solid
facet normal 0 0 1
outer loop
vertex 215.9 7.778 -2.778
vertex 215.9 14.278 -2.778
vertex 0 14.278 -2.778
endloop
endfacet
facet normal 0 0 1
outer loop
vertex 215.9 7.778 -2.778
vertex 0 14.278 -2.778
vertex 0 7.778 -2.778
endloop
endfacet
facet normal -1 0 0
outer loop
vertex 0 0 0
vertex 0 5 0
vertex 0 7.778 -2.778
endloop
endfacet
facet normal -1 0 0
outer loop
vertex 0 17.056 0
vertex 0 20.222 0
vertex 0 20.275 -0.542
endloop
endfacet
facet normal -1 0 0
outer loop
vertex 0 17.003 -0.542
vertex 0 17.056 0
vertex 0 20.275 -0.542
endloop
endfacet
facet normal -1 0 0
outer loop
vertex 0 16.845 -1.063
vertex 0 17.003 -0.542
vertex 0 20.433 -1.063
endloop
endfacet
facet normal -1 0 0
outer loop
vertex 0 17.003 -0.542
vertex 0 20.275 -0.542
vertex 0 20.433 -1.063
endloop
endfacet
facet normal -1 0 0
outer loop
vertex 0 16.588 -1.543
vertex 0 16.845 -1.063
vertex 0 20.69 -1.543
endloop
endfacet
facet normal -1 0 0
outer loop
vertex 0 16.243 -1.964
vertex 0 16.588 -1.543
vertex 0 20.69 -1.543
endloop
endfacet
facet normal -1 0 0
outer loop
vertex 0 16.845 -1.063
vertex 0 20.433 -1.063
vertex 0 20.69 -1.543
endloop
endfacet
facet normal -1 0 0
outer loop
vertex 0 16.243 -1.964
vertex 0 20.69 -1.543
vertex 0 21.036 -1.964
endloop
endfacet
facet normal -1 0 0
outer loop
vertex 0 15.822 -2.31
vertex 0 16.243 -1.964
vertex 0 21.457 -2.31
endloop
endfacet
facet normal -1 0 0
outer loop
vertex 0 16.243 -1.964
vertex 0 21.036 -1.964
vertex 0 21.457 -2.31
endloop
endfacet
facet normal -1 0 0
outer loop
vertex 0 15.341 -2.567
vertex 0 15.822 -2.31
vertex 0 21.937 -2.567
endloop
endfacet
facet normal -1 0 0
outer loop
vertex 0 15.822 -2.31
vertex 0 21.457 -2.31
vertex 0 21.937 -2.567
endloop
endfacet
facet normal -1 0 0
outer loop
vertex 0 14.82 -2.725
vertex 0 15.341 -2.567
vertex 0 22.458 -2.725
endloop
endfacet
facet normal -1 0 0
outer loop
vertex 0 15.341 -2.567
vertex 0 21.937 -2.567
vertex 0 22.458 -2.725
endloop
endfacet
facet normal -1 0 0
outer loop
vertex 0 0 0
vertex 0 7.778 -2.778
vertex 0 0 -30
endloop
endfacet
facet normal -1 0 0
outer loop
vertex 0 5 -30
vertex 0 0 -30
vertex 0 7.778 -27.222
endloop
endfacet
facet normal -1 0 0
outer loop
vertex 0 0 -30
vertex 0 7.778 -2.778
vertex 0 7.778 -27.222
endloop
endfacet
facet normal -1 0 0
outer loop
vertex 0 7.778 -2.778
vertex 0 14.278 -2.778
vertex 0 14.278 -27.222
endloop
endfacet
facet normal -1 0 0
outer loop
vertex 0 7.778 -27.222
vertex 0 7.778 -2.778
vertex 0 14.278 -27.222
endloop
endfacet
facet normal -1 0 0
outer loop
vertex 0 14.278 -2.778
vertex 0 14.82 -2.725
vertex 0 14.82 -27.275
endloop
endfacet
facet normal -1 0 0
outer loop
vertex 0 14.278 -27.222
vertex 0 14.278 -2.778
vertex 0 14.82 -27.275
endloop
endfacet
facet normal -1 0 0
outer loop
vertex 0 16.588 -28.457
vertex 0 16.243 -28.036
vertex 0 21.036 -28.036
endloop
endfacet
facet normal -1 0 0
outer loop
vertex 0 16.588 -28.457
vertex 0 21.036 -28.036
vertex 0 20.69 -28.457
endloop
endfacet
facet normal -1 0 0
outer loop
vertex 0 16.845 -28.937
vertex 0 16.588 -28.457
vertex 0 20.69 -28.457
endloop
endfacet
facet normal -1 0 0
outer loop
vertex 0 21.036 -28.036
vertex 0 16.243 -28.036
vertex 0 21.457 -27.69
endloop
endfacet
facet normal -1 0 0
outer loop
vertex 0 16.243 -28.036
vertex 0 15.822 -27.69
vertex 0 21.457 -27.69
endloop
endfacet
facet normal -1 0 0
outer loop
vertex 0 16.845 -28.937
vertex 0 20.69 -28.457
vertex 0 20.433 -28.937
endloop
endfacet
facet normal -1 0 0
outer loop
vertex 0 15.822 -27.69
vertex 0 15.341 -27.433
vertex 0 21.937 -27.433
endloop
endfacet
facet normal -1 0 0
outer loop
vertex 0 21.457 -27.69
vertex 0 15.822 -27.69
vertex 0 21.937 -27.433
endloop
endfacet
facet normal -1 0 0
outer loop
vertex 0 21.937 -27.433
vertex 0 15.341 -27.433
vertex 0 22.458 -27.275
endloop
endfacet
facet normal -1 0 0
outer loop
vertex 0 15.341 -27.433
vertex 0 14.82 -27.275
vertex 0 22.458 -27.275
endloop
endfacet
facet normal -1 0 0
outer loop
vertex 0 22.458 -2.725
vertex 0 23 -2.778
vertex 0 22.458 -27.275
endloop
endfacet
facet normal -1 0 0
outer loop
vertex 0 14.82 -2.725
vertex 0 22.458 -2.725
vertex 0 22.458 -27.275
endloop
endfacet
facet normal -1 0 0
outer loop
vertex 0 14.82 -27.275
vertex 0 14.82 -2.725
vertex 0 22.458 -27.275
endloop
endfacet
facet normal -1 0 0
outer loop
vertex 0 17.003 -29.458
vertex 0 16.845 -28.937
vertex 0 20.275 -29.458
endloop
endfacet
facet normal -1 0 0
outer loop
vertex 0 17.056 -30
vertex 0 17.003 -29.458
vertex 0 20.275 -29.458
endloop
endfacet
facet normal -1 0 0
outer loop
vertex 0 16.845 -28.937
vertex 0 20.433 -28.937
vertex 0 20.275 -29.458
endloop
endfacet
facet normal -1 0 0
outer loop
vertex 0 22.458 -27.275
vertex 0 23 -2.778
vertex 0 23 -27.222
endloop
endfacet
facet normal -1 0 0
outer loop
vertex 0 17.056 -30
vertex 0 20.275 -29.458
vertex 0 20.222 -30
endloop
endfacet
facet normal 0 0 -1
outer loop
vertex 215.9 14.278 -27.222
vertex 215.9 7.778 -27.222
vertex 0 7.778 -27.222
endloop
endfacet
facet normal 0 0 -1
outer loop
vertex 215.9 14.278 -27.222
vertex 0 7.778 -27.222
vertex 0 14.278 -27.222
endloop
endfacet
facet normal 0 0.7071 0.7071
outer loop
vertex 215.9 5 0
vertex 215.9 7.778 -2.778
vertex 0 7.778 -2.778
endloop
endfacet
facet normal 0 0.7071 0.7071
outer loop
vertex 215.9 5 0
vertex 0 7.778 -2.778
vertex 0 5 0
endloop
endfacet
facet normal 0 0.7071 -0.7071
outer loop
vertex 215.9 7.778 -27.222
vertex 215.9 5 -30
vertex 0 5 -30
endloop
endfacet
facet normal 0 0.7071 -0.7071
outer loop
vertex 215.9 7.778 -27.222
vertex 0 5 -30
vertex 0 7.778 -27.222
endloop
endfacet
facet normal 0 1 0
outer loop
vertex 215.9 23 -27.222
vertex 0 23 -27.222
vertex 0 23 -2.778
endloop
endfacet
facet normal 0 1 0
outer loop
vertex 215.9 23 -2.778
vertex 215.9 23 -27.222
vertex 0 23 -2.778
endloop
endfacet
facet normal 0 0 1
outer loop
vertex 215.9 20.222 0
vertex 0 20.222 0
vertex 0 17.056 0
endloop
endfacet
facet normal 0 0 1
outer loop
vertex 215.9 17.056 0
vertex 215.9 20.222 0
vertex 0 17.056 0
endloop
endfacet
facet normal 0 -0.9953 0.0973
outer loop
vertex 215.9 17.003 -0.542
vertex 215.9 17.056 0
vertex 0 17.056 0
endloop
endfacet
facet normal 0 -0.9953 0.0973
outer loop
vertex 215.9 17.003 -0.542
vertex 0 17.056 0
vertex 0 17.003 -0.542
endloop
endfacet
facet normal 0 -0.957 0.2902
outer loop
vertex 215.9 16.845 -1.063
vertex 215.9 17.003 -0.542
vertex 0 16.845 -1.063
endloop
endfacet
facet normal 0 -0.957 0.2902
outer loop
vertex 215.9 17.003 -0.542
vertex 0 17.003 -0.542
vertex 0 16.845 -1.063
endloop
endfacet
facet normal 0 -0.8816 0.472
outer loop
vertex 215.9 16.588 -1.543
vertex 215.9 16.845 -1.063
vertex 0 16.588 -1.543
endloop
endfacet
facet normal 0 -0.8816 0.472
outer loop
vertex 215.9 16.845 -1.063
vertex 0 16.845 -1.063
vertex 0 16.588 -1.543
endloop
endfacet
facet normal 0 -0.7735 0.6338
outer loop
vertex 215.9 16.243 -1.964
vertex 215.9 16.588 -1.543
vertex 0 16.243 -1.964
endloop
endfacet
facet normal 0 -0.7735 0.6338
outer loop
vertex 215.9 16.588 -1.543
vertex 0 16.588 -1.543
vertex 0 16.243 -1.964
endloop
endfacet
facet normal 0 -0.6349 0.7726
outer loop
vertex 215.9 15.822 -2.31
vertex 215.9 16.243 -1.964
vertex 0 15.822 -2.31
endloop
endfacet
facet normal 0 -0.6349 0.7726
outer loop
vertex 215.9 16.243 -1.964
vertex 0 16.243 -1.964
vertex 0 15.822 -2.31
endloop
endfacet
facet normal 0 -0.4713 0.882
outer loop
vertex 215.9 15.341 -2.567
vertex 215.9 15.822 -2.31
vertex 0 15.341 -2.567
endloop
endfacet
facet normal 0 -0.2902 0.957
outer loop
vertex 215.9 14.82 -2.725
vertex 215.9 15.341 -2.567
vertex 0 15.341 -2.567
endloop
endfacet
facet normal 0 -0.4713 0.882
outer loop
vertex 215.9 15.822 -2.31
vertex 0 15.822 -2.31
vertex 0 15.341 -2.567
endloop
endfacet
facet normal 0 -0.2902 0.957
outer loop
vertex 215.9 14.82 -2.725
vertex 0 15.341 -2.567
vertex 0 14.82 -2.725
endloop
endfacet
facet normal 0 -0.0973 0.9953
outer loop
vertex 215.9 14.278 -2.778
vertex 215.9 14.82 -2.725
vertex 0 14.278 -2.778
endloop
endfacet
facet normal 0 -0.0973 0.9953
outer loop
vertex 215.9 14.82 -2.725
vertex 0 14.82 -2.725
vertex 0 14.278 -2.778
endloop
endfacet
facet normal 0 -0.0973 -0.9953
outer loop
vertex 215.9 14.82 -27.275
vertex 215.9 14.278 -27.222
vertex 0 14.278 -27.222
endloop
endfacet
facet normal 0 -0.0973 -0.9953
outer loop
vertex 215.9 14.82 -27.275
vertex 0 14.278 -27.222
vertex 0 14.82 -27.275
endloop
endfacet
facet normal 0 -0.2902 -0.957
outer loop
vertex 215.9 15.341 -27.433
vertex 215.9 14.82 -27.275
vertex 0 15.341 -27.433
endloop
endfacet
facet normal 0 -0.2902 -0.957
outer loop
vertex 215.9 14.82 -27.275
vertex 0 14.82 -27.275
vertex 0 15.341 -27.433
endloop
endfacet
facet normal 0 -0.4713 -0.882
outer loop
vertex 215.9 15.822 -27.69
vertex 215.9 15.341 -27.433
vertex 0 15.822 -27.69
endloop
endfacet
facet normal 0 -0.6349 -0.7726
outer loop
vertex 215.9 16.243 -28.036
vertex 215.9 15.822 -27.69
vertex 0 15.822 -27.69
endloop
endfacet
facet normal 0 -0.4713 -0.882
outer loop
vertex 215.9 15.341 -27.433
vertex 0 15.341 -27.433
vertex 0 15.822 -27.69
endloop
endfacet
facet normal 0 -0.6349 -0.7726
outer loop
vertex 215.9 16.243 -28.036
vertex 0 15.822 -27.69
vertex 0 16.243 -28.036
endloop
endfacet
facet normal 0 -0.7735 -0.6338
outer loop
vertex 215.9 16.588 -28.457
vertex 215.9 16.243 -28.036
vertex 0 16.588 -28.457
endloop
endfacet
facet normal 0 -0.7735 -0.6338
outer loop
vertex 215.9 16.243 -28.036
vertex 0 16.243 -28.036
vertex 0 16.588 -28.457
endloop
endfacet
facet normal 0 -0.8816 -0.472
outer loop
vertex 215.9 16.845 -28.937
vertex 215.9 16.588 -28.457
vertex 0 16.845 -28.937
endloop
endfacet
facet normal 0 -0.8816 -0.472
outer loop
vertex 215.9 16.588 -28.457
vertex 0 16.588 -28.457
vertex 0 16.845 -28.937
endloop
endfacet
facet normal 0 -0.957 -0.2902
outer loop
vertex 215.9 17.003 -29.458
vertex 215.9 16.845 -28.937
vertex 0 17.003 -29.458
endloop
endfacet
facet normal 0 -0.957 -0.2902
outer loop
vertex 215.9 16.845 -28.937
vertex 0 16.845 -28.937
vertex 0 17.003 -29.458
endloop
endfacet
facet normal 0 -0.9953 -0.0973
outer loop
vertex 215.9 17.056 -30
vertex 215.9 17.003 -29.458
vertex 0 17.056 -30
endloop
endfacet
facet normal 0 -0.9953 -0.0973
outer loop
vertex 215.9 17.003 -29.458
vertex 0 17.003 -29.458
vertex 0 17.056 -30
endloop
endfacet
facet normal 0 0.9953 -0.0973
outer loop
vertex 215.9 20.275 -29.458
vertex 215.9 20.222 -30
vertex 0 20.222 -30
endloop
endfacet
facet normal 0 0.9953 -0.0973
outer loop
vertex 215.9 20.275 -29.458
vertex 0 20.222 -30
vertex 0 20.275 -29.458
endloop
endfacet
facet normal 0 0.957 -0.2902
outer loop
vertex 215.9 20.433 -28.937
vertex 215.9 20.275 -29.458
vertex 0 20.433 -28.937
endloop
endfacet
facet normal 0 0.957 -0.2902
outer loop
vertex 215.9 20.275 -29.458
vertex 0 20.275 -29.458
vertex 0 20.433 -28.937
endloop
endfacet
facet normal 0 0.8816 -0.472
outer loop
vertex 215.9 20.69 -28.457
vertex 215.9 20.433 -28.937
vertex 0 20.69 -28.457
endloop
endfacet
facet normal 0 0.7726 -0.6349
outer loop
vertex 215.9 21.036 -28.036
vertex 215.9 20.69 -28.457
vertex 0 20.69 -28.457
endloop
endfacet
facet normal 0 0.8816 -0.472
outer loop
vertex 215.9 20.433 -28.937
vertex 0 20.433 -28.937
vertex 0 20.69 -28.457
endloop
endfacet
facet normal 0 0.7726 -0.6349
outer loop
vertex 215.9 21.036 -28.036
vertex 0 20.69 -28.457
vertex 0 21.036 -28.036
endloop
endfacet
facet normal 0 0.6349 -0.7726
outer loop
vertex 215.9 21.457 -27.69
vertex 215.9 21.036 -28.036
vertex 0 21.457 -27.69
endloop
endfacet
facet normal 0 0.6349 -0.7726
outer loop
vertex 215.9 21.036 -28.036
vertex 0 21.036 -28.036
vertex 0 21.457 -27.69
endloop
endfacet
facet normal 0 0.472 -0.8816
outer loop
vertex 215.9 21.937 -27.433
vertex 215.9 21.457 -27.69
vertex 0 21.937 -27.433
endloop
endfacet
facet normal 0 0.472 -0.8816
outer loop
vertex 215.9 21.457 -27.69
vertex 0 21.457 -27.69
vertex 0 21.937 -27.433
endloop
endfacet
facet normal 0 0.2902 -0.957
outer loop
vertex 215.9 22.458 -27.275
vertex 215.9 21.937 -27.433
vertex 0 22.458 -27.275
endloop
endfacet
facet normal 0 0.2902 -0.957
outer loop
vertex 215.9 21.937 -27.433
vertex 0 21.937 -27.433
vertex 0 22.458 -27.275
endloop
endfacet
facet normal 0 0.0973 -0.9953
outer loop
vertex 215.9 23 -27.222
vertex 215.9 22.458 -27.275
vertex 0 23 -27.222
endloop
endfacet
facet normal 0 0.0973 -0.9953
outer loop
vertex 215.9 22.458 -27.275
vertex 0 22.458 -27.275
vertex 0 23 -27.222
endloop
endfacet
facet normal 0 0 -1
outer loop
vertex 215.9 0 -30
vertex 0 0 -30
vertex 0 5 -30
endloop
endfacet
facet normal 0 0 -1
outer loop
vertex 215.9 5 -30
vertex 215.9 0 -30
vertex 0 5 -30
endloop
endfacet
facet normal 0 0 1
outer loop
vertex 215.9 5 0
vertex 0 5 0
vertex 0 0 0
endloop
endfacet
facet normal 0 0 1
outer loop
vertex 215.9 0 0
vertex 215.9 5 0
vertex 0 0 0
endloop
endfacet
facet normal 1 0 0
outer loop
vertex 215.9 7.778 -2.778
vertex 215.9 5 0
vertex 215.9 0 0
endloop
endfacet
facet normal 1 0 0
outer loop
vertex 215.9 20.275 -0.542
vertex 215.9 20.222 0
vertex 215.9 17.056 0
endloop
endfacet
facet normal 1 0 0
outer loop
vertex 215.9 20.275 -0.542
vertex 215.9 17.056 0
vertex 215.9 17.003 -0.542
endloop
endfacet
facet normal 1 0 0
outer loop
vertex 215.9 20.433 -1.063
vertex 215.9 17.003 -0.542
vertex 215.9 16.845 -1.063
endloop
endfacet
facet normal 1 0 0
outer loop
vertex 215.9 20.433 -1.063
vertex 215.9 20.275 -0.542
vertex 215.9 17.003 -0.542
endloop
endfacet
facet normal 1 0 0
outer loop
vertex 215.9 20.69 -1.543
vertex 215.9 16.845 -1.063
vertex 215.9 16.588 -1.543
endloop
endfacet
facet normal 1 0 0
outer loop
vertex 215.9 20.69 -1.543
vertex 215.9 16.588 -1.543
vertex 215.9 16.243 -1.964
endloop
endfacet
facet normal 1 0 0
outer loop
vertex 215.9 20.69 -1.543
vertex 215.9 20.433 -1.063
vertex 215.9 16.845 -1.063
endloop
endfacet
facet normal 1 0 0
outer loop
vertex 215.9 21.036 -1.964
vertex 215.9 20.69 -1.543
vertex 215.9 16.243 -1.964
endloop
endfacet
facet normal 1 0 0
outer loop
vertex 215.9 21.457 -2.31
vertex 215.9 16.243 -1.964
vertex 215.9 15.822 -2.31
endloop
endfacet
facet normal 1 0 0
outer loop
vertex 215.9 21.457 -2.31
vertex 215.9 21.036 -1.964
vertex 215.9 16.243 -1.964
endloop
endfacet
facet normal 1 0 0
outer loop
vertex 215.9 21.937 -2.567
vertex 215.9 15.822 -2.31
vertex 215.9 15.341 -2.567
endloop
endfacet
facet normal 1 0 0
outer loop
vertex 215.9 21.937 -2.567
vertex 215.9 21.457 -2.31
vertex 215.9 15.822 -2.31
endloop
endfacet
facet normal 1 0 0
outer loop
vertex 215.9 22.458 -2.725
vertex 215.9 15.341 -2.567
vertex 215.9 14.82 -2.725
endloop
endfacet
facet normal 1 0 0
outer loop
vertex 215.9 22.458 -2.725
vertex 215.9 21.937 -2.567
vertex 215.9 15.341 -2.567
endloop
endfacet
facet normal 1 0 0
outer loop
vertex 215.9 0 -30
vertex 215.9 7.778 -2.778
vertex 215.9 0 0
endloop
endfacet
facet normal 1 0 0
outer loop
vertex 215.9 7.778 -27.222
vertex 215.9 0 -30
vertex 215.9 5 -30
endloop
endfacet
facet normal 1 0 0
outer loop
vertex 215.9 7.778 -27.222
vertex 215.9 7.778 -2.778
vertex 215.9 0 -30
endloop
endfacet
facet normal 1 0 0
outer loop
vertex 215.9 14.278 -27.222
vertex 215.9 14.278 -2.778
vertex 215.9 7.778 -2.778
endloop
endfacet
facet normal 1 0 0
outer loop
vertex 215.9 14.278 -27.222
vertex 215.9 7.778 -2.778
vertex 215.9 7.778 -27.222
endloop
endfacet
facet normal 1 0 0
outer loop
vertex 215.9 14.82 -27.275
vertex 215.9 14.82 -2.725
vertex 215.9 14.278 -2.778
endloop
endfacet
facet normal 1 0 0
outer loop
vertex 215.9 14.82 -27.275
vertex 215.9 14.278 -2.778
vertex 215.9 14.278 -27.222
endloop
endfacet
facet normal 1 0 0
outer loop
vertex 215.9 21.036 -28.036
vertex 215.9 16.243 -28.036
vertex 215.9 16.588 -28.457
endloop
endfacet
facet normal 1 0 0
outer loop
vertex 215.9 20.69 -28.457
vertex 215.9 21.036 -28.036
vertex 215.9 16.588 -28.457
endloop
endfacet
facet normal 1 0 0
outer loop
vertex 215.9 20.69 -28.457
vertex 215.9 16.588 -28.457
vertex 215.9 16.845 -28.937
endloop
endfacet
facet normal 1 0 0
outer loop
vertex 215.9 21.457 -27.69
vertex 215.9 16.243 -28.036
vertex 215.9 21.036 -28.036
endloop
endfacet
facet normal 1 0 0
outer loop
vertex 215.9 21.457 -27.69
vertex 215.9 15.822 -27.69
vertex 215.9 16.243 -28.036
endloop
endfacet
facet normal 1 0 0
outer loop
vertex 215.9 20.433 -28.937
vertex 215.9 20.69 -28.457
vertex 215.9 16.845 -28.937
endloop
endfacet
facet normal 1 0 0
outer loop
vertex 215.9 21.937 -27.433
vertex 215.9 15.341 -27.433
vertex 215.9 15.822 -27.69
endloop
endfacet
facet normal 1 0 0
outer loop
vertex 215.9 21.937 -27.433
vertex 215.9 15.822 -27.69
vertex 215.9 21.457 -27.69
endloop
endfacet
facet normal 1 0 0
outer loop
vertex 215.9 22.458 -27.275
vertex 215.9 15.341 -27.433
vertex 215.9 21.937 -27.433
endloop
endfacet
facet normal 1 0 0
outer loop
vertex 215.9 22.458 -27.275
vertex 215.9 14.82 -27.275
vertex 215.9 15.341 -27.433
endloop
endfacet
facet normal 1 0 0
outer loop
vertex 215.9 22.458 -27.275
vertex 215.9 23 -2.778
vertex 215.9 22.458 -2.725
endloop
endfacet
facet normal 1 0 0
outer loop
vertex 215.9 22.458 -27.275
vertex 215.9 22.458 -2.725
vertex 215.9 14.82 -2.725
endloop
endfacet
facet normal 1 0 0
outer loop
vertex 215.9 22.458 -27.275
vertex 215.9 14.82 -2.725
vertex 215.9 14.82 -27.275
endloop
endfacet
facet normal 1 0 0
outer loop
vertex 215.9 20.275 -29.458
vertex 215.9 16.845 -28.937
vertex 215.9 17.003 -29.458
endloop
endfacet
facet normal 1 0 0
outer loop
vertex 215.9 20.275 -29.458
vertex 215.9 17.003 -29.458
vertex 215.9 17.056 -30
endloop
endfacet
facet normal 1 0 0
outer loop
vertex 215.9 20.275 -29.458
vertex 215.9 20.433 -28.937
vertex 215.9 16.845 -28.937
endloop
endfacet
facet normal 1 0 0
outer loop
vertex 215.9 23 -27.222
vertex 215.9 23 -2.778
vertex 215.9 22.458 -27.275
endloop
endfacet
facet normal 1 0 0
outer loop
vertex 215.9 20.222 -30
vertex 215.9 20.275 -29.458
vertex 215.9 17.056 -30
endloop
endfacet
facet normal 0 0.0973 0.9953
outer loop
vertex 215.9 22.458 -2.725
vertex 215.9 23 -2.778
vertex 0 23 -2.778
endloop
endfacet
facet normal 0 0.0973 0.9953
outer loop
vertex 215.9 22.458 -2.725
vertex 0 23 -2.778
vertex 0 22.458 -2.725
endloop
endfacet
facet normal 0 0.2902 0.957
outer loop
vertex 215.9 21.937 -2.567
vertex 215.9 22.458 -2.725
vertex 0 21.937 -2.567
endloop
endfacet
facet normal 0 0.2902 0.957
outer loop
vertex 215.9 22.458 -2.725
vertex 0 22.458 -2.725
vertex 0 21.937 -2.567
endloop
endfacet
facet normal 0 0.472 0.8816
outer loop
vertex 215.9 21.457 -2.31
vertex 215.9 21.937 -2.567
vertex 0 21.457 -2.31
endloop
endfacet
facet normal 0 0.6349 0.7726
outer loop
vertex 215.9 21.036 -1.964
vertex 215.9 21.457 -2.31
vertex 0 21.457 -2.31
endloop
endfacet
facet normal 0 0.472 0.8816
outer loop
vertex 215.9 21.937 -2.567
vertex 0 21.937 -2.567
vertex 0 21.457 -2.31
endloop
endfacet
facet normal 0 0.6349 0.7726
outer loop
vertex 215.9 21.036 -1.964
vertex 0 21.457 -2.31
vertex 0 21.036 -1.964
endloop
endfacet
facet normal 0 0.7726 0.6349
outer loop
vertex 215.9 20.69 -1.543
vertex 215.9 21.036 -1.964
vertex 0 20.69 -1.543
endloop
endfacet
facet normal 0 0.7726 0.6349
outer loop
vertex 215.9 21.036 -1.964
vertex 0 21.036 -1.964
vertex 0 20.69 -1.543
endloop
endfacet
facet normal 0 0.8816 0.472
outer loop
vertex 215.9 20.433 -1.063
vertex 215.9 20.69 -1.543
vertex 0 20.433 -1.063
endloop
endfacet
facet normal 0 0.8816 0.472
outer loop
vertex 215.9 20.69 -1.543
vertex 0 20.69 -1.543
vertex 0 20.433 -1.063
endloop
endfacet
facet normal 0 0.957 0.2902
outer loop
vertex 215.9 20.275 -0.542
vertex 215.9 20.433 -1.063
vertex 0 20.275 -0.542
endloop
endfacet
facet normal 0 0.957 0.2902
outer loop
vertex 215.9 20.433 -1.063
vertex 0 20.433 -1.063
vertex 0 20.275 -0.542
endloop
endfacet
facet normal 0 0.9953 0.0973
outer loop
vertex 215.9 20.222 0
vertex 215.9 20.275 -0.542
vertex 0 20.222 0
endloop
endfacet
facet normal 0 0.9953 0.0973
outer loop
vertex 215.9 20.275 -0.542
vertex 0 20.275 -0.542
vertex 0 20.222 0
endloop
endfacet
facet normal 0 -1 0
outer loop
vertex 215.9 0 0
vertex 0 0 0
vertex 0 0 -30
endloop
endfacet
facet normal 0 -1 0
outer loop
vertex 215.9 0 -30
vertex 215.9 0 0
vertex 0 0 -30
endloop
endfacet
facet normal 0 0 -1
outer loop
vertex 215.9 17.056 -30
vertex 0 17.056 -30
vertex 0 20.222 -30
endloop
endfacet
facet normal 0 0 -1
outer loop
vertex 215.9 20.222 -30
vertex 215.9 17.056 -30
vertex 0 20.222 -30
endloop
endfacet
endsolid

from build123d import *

# Parameters (mm, degrees)
BOSS_EXTRUDE1_DEPTH = 215.9


with BuildPart() as part:
    # Sketch1 → Boss-Extrude1 (new body)
    with BuildSketch(Plane(origin=(0, 0, 0), x_dir=(0, 0, -1), z_dir=(1, 0, 0))):
        with BuildLine():
            Line((0, 0), (30, 0))
            Line((30, 0), (30, 5))
            Line((30, 5), (27.221875, 7.778125))
            Line((27.221875, 7.778125), (27.221875, 14.278125))
            ThreePointArc((27.221875, 14.278125), (28.035568974, 16.242556026), (30, 17.05625))
            Line((30, 17.05625), (30, 20.221875))
            ThreePointArc((30, 20.221875), (28.035568974, 21.035568974), (27.221875, 23))
            Line((27.221875, 23), (2.778125, 23))
            ThreePointArc((2.778125, 23), (1.964431026, 21.035568974), (0, 20.221875))
            Line((0, 20.221875), (0, 17.05625))
            ThreePointArc((0, 17.05625), (1.964431026, 16.242556026), (2.778125, 14.278125))
            Line((2.778125, 14.278125), (2.778125, 7.778125))
            Line((2.778125, 7.778125), (0, 5))
            Line((0, 5), (0, 0))
        make_face()
    extrude(amount=BOSS_EXTRUDE1_DEPTH)


solid = part.part
